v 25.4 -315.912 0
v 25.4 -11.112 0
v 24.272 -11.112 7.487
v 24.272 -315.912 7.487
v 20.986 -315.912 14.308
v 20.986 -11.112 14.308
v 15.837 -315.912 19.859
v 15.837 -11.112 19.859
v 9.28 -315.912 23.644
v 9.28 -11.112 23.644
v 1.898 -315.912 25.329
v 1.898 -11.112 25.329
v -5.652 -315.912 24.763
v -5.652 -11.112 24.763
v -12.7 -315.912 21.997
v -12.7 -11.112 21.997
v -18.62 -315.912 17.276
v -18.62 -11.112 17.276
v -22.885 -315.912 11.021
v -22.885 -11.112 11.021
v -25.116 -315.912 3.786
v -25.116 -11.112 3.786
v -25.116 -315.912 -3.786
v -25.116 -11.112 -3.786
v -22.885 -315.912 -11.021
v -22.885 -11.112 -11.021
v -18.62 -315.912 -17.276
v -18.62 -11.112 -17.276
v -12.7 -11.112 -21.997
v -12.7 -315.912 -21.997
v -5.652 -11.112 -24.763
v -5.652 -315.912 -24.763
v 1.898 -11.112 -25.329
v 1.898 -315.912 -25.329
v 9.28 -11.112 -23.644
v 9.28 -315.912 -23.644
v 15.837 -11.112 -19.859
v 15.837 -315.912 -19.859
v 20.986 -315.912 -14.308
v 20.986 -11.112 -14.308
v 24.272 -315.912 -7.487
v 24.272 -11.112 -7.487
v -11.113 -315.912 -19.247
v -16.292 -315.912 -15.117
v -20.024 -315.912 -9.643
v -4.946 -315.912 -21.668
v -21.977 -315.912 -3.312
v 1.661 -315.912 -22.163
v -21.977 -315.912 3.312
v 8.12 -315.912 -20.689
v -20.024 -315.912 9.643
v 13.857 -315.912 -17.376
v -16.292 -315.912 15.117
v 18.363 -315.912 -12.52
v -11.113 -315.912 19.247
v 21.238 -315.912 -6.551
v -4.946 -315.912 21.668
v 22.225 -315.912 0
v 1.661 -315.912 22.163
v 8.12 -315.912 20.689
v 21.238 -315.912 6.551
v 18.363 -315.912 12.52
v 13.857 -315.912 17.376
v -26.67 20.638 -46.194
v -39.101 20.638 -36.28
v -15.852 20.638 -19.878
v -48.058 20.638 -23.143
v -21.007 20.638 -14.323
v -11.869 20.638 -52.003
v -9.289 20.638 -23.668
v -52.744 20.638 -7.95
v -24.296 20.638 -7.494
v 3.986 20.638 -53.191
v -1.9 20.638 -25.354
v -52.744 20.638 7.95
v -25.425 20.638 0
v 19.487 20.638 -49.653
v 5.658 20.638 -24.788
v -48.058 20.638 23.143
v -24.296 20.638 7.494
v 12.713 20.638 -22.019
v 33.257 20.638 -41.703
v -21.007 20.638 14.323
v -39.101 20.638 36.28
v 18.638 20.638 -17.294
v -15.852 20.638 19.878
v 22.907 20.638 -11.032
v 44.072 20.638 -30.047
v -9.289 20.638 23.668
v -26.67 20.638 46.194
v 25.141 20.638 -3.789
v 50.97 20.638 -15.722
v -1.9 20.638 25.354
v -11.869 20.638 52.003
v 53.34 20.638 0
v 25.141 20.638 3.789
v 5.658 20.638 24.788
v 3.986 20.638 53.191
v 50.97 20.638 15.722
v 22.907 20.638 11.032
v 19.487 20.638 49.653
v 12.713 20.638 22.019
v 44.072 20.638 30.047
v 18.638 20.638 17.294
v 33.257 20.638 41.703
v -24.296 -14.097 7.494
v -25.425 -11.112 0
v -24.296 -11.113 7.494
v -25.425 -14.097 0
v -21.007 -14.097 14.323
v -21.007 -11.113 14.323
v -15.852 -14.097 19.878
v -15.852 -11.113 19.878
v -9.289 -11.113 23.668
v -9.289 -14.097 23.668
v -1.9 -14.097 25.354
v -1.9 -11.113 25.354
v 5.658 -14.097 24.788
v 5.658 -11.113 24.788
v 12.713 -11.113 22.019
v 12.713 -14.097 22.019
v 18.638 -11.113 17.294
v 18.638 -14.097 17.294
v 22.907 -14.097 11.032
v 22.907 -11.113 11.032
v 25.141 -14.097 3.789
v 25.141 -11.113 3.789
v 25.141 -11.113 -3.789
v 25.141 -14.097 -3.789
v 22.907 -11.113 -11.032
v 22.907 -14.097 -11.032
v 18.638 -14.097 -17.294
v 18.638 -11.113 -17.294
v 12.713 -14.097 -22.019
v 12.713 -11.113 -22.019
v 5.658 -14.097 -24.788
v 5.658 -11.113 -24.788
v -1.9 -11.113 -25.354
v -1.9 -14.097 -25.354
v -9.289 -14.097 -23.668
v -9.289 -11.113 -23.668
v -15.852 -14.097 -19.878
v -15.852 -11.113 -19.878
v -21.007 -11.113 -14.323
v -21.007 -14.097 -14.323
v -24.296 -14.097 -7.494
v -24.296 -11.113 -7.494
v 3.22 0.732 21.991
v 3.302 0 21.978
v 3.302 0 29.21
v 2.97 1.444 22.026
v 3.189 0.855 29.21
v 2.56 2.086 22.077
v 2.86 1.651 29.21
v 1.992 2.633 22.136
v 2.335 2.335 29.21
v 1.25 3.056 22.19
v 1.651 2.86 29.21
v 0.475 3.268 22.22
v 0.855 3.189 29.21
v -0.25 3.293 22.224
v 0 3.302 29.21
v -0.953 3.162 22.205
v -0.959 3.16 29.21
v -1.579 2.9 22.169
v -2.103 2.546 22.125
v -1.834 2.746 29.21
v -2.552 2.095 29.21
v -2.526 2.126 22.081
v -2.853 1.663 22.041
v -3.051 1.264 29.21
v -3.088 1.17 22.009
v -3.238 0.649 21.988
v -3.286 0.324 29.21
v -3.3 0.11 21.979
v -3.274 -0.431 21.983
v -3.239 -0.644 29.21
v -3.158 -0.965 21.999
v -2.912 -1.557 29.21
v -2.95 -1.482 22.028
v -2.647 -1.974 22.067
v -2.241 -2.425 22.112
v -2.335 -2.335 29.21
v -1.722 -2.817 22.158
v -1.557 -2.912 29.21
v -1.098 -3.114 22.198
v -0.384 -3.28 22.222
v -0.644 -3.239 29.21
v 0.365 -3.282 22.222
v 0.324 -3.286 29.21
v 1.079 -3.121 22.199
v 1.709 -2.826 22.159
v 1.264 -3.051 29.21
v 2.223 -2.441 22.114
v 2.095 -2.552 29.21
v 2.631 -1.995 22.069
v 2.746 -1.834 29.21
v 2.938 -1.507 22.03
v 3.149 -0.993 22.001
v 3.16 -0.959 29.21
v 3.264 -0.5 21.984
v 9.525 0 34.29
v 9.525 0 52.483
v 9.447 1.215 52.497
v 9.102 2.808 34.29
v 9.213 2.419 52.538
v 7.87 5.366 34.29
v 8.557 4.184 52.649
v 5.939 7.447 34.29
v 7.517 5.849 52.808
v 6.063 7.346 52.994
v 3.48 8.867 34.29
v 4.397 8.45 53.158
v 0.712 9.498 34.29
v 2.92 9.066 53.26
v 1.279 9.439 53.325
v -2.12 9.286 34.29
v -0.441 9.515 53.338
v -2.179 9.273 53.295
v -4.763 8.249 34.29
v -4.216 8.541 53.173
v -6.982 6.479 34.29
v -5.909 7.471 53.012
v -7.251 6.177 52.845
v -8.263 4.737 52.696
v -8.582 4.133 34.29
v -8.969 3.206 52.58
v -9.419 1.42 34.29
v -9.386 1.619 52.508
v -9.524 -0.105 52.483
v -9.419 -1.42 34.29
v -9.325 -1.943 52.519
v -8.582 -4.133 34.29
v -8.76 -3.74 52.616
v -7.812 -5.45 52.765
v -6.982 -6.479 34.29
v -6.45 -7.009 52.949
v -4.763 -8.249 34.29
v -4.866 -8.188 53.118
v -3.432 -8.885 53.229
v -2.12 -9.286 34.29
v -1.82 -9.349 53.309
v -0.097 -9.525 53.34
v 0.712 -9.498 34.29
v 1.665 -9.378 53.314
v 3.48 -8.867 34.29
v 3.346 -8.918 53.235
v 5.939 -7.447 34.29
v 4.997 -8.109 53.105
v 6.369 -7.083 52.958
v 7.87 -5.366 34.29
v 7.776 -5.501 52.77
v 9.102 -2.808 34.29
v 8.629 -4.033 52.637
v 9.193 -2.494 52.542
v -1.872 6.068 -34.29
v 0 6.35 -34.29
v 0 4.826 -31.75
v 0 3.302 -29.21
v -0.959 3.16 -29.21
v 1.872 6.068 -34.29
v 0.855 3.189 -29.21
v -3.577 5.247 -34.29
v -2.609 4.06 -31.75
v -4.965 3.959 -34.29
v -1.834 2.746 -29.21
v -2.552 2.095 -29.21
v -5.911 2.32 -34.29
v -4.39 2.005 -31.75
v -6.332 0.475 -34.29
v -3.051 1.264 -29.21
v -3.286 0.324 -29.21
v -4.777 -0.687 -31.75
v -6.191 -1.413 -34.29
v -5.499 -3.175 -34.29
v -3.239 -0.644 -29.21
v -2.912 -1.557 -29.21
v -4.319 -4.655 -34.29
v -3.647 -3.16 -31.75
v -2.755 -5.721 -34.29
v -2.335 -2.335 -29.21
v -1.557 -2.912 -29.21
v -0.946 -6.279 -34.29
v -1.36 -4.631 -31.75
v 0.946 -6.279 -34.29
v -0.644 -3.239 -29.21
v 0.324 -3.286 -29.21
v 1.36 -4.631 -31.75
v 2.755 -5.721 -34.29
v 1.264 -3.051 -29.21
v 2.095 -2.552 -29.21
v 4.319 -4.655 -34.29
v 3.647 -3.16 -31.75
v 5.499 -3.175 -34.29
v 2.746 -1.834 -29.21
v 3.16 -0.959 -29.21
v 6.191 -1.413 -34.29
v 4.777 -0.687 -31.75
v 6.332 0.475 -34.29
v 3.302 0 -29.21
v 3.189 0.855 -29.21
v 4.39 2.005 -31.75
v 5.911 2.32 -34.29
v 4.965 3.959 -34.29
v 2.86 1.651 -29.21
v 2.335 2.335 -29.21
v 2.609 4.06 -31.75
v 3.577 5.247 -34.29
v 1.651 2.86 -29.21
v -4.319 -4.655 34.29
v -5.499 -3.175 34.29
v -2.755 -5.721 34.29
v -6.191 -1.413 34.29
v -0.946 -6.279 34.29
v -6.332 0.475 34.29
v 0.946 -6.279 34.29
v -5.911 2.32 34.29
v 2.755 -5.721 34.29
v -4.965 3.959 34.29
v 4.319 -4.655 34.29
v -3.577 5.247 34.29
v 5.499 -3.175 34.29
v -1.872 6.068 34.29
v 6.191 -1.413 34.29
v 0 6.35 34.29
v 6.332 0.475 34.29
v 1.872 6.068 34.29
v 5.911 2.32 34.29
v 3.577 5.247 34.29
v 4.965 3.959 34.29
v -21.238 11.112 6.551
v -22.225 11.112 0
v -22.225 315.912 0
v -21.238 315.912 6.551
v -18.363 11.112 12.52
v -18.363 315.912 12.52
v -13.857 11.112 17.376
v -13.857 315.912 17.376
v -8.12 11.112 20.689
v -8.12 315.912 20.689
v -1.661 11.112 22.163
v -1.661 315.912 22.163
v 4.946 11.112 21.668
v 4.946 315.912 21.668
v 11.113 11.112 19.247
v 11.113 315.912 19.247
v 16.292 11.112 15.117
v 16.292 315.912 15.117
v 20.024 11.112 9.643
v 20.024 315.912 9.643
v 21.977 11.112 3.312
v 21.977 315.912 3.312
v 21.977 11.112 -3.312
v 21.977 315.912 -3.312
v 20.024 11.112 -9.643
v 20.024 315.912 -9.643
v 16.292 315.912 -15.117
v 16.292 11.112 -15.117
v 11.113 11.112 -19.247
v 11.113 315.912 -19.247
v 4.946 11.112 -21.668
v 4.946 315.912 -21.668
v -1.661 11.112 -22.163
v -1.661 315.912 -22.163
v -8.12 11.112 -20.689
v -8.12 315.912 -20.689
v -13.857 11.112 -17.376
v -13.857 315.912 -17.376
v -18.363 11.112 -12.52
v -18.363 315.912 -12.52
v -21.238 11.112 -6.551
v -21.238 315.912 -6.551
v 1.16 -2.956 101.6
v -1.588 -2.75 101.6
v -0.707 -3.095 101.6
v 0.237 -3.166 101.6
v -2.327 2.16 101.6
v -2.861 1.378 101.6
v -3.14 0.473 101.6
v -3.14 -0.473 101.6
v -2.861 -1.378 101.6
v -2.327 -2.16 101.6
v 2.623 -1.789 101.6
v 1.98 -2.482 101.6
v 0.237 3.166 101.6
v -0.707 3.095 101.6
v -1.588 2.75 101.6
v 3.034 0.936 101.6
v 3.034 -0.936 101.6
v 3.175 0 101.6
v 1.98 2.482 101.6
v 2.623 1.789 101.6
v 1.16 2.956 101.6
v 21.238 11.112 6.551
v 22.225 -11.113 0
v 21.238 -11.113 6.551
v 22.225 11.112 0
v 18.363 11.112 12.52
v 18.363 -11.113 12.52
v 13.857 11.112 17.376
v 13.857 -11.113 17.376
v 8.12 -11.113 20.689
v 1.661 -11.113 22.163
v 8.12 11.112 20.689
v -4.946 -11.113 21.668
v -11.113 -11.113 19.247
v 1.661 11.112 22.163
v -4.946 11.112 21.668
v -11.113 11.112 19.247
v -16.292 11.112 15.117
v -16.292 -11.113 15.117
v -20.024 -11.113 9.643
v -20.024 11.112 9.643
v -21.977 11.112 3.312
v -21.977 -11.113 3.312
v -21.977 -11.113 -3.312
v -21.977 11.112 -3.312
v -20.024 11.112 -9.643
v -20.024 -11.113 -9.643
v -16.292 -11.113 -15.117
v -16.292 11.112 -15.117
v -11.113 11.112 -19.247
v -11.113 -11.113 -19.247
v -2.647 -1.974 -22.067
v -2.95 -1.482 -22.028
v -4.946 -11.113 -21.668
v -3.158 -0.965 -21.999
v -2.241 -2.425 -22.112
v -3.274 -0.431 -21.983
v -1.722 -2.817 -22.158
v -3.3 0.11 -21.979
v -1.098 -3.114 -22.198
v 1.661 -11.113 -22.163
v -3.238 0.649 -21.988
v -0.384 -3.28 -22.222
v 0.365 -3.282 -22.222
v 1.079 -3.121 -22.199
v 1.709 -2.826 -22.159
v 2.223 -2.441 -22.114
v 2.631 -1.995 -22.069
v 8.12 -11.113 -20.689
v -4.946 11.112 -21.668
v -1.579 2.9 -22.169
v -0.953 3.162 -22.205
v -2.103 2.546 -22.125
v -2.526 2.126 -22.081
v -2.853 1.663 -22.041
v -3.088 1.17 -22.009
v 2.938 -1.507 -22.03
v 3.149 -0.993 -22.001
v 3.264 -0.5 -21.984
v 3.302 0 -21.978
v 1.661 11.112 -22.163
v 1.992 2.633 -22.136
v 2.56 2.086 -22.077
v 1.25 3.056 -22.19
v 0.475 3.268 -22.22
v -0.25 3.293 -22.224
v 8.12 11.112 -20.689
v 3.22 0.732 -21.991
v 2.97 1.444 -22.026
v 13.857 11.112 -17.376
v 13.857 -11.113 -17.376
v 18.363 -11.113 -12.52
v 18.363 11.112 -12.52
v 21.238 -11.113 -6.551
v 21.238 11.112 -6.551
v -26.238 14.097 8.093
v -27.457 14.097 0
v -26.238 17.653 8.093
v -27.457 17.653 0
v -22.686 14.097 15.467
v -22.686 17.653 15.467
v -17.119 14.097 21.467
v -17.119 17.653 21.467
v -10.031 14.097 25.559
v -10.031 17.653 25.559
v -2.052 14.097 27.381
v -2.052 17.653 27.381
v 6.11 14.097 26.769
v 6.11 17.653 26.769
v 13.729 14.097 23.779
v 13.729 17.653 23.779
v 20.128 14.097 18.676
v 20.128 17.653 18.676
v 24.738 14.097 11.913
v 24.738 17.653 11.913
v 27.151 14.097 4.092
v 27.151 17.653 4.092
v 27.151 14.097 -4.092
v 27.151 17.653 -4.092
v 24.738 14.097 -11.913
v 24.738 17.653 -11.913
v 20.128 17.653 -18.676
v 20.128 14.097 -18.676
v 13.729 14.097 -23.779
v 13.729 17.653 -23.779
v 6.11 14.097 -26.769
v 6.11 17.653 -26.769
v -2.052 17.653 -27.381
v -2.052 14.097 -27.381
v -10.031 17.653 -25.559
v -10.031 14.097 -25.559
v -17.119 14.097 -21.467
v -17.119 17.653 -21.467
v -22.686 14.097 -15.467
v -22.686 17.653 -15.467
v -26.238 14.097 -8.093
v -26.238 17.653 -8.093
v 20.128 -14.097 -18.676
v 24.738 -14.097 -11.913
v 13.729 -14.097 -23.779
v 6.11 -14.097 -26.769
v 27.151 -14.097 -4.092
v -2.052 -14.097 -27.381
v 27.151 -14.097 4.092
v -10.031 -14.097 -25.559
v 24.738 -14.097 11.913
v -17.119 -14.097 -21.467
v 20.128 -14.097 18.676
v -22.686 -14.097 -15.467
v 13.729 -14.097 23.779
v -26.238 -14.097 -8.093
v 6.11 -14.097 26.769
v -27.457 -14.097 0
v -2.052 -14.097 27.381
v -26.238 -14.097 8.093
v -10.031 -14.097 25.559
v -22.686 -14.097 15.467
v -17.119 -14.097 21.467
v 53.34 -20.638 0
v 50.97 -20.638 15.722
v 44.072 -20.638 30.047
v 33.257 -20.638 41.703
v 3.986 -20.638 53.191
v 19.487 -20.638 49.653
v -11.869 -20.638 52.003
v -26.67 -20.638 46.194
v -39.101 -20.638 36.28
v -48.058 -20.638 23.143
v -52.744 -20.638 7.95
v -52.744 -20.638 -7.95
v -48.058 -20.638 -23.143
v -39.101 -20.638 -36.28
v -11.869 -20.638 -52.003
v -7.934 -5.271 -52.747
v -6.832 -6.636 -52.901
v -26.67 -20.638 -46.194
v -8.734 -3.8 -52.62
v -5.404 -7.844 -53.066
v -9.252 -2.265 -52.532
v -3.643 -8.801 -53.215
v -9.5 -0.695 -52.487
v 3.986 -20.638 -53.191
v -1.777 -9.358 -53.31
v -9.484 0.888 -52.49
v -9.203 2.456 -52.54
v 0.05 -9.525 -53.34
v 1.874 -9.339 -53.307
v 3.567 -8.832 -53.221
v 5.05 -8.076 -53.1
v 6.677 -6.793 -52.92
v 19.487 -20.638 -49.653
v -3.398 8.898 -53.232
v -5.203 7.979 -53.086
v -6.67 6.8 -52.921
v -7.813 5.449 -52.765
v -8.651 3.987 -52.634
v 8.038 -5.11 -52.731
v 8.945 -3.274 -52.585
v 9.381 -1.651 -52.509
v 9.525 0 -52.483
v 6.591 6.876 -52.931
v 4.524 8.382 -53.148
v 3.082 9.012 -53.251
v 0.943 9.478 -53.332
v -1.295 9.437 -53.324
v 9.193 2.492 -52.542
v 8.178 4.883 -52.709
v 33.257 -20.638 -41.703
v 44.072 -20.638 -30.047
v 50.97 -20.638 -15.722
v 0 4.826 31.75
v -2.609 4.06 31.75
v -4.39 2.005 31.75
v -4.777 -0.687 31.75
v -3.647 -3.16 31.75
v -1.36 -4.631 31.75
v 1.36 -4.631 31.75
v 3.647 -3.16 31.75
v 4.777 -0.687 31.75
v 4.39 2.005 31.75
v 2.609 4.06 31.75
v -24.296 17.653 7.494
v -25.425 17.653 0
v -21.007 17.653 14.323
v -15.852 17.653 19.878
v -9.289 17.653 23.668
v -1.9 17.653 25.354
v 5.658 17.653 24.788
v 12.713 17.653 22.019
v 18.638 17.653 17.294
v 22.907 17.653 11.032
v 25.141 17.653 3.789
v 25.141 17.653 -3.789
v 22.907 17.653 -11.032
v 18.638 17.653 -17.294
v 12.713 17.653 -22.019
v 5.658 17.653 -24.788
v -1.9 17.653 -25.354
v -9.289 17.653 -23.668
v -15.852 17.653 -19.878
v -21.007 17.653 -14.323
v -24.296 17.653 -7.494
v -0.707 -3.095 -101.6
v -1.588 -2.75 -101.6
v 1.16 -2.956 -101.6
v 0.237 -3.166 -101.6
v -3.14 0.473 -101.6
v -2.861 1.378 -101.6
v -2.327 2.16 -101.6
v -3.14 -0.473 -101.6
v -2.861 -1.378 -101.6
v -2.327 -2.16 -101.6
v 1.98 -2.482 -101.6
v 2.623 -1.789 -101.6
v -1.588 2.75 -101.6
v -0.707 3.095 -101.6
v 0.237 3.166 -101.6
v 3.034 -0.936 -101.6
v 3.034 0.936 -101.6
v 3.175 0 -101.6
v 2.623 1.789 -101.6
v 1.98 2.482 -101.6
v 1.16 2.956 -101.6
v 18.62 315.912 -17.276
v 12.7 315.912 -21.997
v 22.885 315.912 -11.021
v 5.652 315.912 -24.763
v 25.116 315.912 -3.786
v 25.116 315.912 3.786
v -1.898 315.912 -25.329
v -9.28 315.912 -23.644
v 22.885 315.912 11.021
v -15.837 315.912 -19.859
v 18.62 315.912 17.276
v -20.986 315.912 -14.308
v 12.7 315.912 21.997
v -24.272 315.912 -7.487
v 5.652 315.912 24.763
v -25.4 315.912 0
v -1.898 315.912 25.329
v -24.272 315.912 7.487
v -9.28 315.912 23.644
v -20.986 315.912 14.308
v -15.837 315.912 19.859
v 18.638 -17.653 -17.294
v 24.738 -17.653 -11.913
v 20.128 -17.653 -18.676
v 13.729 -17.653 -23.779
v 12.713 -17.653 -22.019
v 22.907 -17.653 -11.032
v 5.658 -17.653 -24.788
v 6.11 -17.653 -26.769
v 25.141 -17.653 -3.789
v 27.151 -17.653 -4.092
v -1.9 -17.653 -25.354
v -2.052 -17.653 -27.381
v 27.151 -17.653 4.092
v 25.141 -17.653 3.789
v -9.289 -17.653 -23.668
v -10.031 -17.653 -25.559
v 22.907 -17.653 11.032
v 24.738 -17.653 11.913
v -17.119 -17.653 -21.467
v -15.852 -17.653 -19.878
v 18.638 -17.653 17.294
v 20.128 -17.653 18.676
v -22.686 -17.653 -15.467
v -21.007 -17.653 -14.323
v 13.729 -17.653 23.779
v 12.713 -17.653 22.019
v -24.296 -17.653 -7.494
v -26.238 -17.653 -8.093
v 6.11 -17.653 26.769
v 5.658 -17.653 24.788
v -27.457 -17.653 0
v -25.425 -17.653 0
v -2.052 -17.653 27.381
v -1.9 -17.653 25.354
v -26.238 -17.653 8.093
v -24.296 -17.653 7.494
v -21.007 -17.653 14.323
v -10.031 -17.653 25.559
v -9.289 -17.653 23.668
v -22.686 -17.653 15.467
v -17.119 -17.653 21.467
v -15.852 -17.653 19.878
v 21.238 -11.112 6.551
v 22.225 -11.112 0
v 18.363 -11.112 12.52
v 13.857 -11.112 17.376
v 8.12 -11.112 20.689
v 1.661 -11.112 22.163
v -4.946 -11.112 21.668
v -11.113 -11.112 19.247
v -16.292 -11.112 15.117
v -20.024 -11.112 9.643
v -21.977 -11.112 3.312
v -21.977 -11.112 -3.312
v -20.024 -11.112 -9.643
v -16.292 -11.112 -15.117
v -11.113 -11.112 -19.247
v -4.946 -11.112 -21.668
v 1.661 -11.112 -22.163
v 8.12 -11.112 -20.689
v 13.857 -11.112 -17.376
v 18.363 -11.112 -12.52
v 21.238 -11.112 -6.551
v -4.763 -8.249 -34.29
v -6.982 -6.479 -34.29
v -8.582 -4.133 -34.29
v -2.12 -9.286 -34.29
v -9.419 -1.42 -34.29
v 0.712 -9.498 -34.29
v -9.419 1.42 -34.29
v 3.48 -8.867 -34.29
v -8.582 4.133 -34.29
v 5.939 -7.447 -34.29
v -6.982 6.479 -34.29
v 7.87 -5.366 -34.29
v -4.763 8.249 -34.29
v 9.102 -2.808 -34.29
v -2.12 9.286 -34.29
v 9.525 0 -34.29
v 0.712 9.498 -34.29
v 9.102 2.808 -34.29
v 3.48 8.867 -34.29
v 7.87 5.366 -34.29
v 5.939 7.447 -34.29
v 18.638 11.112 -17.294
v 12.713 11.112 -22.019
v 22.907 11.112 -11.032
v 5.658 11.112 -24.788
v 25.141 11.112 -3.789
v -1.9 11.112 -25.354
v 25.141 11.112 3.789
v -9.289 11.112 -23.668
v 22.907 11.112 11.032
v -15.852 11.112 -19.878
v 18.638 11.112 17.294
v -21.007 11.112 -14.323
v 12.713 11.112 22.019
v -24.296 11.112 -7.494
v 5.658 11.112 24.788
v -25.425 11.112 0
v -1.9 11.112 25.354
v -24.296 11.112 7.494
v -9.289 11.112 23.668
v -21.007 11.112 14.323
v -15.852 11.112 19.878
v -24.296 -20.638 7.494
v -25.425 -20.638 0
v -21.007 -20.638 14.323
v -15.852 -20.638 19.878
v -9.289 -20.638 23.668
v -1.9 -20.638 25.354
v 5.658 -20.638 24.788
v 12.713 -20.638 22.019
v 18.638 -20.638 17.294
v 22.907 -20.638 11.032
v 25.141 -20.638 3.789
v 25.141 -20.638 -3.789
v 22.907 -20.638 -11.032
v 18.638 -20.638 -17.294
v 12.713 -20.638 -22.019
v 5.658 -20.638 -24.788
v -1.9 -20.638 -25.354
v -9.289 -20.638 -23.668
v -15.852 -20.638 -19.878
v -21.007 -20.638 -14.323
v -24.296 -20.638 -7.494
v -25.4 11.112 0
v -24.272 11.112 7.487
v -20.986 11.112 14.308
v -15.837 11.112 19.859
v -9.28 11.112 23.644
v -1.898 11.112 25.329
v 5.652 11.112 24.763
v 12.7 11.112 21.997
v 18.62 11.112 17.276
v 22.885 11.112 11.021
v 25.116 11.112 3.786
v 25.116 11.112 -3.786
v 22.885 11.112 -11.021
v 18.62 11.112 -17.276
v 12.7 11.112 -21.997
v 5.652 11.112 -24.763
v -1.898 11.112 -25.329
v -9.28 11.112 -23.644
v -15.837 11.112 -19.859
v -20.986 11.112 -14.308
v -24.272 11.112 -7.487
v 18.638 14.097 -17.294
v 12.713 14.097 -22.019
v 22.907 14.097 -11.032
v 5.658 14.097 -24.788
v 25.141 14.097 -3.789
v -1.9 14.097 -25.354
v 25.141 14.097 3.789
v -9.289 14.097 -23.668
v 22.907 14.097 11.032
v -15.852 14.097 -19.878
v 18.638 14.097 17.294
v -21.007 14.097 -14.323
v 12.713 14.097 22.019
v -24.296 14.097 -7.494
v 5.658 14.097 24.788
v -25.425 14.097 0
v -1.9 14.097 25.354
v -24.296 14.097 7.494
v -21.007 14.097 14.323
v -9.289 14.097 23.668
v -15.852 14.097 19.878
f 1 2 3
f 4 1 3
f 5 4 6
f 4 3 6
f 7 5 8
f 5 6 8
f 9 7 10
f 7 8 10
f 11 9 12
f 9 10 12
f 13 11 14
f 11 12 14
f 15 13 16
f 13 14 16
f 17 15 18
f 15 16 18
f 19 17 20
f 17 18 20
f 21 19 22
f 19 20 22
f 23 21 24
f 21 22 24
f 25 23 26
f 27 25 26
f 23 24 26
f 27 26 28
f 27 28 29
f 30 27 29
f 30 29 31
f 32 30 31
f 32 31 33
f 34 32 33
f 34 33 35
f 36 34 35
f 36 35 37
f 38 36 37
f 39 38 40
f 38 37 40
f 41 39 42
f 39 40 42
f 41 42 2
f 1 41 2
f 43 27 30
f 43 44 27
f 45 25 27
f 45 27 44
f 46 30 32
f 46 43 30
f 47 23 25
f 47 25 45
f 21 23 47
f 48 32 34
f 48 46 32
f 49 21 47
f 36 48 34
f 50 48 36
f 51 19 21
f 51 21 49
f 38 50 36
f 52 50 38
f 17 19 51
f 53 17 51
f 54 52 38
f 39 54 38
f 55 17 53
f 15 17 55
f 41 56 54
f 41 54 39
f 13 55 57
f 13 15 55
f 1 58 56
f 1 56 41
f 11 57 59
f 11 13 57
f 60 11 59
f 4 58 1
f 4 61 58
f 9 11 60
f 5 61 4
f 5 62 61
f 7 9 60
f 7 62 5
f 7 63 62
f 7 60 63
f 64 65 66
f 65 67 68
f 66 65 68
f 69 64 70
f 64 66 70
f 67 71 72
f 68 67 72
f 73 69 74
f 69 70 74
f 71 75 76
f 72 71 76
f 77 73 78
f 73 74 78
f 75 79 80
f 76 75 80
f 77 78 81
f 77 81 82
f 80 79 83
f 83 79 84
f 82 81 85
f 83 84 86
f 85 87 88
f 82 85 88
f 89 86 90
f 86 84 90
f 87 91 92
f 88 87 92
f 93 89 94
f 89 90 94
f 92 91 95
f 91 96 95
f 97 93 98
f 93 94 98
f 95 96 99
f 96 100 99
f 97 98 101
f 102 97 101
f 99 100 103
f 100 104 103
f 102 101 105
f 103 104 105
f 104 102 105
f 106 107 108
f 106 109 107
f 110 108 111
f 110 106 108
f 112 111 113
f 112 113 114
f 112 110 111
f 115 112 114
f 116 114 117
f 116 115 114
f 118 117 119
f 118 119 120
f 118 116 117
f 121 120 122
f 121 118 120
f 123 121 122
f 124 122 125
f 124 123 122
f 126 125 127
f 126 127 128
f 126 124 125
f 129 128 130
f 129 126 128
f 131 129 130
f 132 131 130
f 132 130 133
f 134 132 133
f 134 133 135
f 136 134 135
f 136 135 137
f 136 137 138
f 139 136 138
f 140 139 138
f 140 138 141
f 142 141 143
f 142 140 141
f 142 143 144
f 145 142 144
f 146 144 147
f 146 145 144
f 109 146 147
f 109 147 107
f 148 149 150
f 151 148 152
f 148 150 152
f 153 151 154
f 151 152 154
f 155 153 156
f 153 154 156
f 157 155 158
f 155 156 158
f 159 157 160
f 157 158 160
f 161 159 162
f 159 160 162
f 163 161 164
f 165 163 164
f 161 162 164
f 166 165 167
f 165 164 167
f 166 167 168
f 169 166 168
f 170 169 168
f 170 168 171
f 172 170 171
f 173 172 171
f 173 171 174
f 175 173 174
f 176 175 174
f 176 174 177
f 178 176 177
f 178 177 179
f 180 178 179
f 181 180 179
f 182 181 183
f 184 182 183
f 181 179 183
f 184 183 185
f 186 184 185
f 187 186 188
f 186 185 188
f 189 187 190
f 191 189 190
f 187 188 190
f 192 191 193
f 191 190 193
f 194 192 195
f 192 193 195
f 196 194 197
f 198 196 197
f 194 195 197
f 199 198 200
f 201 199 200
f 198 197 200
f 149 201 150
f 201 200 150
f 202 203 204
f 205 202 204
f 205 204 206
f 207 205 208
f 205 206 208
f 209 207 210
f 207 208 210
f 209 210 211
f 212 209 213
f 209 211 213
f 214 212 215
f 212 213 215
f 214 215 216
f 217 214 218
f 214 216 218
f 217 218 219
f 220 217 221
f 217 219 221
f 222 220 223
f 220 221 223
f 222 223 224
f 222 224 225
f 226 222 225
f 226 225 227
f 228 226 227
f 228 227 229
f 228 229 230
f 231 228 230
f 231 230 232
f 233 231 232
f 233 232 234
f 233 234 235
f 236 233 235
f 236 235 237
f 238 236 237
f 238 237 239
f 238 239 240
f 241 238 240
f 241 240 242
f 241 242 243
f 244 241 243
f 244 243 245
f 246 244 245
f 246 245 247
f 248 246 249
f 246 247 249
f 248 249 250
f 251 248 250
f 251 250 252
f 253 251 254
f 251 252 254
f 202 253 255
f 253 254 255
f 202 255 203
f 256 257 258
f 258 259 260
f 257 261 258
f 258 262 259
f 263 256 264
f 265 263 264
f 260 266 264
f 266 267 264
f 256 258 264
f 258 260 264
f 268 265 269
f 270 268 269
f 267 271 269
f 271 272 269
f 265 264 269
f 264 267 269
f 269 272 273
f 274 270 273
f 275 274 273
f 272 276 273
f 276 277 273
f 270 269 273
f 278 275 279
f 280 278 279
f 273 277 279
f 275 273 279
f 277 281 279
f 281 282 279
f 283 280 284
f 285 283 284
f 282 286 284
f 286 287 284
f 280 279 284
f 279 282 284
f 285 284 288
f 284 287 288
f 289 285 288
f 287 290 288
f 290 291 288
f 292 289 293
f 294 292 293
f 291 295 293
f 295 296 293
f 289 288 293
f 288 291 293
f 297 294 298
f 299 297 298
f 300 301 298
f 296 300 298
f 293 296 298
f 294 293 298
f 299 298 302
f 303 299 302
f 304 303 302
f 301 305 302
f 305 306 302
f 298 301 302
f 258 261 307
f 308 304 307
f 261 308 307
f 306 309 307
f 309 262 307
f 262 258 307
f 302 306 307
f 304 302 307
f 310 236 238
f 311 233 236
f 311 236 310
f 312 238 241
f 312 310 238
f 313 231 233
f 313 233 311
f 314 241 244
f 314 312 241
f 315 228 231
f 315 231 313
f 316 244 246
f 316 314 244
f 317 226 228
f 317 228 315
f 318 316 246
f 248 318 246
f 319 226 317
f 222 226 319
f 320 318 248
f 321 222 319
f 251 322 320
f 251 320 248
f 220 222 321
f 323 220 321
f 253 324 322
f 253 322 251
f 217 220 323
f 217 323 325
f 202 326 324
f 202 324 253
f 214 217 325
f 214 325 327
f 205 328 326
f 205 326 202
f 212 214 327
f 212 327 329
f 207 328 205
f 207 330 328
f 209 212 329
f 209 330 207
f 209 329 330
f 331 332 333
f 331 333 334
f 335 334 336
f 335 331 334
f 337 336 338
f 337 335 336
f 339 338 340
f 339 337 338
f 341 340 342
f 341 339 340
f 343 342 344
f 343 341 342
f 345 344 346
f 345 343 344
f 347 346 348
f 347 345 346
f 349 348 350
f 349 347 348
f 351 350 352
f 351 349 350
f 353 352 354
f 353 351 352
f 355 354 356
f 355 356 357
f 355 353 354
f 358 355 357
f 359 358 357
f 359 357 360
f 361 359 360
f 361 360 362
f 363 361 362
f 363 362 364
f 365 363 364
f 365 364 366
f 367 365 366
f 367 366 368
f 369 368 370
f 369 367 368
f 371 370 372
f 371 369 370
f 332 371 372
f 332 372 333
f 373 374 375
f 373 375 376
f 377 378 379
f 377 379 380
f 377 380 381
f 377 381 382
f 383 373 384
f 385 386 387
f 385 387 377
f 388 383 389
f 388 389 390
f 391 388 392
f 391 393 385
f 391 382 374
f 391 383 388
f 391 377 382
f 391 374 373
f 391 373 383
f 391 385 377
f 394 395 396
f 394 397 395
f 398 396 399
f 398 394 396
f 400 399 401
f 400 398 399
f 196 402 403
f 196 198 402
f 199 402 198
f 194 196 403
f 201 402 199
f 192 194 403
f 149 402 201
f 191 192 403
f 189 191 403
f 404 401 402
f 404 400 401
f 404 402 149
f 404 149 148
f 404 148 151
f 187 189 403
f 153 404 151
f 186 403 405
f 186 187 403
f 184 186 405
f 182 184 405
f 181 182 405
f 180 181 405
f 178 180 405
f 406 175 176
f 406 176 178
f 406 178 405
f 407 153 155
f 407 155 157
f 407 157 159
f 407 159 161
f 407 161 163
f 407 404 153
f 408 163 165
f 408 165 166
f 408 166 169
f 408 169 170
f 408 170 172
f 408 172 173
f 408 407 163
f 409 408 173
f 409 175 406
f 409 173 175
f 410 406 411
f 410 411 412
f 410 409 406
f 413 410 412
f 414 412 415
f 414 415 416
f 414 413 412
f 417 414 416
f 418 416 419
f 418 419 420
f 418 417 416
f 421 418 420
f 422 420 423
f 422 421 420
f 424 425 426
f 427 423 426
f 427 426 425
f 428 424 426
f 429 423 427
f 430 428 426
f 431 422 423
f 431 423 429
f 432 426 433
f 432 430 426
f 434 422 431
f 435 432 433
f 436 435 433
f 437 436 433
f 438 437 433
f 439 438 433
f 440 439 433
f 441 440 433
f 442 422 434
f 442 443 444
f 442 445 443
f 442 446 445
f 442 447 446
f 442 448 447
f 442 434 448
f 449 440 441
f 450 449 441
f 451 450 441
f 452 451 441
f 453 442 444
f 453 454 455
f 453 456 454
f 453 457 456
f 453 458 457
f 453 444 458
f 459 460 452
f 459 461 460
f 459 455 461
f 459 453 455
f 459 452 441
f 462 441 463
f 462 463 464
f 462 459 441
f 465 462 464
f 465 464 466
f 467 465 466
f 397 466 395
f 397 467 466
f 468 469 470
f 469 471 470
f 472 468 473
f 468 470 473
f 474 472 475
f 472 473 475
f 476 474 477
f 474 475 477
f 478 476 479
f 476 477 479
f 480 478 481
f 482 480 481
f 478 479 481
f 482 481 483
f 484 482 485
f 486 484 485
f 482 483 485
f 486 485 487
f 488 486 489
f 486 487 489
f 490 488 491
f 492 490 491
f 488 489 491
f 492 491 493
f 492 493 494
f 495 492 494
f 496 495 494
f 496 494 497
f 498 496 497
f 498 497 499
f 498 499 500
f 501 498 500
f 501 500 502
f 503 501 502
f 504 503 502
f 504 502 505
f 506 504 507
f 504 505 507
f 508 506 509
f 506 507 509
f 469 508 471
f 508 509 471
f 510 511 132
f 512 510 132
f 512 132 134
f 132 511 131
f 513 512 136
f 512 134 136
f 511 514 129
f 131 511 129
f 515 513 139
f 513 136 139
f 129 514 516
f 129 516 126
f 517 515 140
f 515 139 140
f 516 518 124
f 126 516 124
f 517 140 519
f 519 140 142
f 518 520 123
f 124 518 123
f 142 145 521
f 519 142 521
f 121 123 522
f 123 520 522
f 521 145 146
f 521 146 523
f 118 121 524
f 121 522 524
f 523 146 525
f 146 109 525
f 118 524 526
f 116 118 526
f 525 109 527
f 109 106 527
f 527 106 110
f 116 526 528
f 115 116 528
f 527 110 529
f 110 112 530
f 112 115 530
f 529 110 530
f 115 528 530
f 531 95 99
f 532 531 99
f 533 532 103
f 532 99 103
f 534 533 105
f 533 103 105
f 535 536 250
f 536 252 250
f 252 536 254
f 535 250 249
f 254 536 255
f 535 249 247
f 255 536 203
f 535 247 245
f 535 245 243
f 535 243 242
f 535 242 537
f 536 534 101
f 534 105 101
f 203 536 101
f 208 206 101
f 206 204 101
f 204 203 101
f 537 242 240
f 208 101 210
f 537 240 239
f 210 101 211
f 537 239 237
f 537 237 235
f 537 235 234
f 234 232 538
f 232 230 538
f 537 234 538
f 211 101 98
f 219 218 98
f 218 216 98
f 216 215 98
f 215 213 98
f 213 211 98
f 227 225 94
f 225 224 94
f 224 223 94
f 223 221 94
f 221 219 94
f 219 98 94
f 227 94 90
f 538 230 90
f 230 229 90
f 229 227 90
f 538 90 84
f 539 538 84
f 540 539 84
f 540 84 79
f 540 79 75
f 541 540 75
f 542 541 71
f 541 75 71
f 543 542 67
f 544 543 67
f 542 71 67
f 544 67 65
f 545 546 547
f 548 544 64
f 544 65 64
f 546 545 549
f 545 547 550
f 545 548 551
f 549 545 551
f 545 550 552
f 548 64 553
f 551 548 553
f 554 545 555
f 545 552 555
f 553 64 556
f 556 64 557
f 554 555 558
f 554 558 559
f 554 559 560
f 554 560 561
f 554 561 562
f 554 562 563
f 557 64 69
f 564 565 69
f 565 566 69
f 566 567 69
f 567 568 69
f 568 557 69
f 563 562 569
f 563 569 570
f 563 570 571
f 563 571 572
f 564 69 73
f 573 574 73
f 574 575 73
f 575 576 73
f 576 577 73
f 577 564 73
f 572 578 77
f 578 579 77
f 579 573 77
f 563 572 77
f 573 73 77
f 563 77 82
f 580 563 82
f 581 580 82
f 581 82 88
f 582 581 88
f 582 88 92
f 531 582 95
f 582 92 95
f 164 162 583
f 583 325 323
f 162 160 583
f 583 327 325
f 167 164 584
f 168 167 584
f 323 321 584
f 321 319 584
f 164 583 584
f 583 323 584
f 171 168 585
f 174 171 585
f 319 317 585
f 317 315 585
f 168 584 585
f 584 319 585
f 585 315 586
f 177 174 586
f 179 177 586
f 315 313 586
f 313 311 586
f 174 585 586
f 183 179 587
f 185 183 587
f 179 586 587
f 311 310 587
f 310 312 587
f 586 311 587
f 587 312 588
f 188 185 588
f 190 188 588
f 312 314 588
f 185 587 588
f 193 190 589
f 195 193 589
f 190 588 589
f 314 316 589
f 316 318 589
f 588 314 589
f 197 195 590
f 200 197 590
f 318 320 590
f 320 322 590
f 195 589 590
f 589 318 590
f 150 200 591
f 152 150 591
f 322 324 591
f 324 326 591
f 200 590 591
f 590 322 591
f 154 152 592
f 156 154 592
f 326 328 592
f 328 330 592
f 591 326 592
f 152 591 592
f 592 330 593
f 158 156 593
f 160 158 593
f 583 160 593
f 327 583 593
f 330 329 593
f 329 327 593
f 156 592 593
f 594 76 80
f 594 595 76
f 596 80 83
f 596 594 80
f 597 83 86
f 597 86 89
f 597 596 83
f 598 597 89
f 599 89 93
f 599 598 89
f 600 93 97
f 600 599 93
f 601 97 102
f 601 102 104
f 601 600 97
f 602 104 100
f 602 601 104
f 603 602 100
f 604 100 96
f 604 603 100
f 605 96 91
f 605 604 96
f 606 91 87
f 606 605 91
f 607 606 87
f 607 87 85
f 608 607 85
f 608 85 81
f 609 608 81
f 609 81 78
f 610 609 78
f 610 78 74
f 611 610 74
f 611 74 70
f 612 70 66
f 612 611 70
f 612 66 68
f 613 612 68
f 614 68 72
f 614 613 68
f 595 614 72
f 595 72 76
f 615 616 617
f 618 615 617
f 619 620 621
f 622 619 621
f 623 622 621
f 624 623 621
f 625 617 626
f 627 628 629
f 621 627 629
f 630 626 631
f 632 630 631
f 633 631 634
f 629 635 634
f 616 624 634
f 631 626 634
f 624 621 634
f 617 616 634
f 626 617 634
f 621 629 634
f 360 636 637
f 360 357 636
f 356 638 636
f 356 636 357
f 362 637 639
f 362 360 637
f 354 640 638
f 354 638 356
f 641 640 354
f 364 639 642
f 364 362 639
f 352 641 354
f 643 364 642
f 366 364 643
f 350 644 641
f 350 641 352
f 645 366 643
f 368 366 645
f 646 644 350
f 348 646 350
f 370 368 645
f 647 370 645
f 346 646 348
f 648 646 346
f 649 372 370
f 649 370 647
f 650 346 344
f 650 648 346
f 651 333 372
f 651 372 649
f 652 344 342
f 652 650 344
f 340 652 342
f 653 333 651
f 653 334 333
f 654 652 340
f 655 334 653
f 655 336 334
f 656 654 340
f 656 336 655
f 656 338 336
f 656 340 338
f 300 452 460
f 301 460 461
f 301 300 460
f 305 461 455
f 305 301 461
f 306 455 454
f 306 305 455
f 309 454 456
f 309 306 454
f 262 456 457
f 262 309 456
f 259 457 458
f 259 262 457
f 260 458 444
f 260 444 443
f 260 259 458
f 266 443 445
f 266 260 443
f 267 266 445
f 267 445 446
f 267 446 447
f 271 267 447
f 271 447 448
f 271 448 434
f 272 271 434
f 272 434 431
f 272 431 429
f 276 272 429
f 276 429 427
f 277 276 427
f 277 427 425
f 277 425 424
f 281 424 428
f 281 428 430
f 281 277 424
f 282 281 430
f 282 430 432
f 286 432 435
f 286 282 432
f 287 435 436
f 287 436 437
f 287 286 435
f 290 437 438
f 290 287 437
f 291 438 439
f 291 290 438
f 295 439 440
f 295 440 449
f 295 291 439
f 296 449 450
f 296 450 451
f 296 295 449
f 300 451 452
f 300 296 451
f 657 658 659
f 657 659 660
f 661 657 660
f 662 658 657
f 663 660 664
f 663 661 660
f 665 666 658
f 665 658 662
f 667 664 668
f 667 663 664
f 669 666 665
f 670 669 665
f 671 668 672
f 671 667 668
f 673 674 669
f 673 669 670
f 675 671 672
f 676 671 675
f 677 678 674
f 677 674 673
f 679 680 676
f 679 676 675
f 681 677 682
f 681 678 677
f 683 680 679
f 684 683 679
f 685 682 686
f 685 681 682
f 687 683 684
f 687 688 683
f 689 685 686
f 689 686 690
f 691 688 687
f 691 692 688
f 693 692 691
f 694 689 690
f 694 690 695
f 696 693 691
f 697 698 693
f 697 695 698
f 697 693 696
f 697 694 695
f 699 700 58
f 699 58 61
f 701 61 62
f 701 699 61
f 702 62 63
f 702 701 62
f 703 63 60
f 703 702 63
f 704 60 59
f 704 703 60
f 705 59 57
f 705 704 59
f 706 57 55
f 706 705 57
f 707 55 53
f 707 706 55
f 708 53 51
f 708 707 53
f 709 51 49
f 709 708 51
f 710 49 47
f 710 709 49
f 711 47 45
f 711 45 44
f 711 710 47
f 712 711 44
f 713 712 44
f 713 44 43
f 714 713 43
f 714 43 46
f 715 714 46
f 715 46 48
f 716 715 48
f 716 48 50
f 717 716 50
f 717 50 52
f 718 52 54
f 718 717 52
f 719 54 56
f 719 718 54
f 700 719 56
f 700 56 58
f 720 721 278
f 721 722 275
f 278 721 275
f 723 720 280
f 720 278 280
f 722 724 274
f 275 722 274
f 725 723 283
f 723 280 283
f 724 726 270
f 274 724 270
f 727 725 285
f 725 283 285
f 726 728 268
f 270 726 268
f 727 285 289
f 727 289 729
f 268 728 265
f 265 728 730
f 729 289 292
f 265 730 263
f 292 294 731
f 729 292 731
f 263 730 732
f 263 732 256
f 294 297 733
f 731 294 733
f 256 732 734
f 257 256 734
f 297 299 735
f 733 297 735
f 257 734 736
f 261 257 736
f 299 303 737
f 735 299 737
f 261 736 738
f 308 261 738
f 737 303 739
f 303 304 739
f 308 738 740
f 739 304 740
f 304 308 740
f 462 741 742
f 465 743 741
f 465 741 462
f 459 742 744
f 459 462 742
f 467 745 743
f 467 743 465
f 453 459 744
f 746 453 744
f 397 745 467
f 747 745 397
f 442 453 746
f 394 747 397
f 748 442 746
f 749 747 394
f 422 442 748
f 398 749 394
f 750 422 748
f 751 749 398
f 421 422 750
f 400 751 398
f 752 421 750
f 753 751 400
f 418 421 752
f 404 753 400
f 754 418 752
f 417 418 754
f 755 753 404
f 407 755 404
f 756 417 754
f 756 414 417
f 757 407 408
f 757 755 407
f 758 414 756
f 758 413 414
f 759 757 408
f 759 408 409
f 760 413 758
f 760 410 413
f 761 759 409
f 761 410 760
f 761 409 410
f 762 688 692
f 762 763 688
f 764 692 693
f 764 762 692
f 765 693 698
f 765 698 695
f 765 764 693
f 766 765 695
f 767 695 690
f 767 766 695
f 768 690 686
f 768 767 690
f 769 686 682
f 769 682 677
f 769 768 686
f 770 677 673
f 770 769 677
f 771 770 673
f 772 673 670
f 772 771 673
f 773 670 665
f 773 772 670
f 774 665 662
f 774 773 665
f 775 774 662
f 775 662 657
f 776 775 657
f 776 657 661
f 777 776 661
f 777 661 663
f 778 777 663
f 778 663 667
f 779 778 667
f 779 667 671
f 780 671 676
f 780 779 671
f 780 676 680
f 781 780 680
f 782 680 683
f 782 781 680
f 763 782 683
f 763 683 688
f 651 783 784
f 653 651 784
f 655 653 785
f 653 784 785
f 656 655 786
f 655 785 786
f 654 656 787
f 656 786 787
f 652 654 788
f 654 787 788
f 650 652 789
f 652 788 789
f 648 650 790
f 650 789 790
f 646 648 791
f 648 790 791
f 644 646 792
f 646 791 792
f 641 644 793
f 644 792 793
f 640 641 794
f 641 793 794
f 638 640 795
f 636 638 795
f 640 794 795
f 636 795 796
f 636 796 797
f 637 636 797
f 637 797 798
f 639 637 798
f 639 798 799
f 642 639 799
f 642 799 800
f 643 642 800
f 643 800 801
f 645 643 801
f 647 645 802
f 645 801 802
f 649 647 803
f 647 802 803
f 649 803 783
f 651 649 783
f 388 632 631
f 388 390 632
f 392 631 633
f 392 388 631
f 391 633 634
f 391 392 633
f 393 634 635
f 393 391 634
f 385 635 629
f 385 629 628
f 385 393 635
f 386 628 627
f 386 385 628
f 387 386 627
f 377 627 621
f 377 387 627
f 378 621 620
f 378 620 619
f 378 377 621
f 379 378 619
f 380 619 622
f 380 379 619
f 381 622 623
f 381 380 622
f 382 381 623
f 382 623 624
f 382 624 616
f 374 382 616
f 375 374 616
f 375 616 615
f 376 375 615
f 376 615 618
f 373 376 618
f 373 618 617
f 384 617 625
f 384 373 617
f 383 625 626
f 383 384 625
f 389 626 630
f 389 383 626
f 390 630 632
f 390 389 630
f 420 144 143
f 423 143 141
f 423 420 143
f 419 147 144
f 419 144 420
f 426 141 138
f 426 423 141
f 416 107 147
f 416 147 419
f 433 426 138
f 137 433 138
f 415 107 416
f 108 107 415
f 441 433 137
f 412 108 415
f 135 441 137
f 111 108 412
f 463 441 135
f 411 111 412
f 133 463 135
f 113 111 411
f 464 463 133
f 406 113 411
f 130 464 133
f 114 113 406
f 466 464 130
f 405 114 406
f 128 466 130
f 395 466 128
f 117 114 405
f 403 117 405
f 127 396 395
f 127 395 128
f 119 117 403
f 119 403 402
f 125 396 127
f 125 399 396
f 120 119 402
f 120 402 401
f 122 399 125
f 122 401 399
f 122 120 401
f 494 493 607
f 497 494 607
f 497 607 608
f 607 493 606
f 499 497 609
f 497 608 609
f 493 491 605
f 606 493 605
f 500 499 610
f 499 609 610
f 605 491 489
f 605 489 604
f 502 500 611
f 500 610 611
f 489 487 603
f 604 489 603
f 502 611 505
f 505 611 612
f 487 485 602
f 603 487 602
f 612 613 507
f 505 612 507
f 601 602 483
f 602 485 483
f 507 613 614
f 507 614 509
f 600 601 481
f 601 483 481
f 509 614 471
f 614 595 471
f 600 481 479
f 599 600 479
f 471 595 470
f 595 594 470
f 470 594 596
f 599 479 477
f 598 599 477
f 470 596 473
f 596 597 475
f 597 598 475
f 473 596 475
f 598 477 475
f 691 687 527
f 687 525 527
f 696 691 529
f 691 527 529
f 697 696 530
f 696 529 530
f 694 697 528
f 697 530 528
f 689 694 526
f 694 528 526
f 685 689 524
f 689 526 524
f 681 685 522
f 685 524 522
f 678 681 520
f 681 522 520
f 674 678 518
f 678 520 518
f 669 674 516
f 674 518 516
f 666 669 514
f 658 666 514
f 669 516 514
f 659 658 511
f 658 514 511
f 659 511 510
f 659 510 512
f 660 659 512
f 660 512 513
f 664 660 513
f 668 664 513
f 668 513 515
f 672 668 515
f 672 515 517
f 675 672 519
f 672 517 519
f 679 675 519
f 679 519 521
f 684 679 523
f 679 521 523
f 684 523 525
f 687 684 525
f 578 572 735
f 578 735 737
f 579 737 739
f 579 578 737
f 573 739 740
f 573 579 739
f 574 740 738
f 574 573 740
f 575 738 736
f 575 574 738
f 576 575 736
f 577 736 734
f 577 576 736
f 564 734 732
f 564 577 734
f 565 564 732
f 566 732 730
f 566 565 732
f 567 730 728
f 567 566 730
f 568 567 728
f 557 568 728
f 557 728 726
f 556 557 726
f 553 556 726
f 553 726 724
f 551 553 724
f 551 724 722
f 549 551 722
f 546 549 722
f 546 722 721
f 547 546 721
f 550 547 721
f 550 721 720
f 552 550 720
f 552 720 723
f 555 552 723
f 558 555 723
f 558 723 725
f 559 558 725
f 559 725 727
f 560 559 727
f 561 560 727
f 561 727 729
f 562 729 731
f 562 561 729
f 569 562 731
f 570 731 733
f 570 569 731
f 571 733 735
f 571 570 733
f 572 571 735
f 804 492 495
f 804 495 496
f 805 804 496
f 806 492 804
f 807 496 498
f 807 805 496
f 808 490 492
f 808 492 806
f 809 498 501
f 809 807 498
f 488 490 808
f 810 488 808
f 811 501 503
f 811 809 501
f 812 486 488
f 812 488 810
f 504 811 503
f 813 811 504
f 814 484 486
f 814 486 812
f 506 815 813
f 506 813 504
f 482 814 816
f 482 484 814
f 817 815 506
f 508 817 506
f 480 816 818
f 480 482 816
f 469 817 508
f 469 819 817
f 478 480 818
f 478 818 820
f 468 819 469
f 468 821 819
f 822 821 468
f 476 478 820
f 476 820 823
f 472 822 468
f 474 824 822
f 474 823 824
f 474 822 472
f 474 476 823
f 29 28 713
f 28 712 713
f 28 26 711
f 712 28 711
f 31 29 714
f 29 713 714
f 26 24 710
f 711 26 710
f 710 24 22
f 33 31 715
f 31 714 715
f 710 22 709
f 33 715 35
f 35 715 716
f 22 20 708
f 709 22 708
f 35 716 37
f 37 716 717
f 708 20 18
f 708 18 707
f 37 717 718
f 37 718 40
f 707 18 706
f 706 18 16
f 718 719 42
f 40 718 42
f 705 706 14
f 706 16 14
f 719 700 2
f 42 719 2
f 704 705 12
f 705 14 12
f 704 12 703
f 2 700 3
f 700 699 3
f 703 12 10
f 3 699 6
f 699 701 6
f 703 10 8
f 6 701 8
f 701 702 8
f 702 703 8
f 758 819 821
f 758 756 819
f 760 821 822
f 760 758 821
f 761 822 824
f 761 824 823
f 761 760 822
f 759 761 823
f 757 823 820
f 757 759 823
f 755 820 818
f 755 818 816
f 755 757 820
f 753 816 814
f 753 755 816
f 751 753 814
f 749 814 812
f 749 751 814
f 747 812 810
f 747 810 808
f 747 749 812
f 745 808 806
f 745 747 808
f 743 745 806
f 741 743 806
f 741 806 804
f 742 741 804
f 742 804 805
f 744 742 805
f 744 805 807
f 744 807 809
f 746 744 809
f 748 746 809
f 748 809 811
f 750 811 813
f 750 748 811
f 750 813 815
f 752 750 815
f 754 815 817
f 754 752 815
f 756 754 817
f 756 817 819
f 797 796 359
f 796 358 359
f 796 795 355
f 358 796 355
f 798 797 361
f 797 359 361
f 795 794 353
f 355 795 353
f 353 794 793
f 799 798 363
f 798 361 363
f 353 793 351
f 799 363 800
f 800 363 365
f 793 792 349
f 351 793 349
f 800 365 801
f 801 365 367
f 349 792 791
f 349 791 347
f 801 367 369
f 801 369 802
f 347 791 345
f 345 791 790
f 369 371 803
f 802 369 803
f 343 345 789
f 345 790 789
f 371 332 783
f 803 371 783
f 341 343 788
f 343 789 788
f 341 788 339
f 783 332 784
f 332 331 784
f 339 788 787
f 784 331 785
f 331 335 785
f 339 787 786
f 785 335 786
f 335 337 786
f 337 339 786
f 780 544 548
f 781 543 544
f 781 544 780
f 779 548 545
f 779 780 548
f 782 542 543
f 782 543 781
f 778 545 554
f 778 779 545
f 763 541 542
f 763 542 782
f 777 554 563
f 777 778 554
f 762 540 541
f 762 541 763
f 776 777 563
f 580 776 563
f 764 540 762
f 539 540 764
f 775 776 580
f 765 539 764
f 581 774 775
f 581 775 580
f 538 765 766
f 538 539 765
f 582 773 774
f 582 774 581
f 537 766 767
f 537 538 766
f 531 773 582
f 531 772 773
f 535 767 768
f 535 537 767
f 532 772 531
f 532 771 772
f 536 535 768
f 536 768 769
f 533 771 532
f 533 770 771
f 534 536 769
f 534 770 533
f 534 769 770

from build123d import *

# Parameters (mm, degrees)
F0_R      = 53.34
F0_R_2    = 22.225
F1_DEPTH  = 20.6375
F6_DEPTH  = 20.6375
F5_R      = 9.525
F5_R_2    = 3.302
F7_DEPTH  = 19.05
F8_DEPTH  = 32.3616602869
F4_R      = 9.525
F4_R_2    = 3.302
F9_DEPTH  = 19.05
F10_DEPTH = 32.3616602869
F13_W     = 2.032
F13_H     = 3.556
F15_R     = 3.175
F16_DEPTH = 101.6
F19_R     = 25.4
F19_R_2   = 22.225
F20_DEPTH = 304.8
F21_R     = 25.4
F21_R_2   = 22.225
F22_DEPTH = 304.8


# Not quite as in the source:
# - the program builds the solid bodies; features that only make, move or delete a surface that nothing else refers to are left out


with BuildPart() as f1:
    # F0 (on Front) → F1 (new body)
    with BuildSketch(Plane.XZ):
        Circle(F0_R)
        Circle(F0_R_2, mode=Mode.SUBTRACT)
    extrude(amount=-F1_DEPTH)

    # F0 (on Front) → F6 (join)
    with BuildSketch(Plane.XZ):
        Circle(F0_R)
        Circle(F0_R_2, mode=Mode.SUBTRACT)
    extrude(amount=F6_DEPTH)

    # F5 (on offset) → F7 (cut)
    with BuildSketch(Plane.XY.offset(-53.34)):
        Circle(F5_R)
        Circle(F5_R_2, mode=Mode.SUBTRACT)
        Circle(F5_R_2)
    extrude(amount=F7_DEPTH, mode=Mode.SUBTRACT)

    # F5 (on offset) → F8 (cut, up to face)
    with BuildSketch(Plane.XY.offset(-53.34)):
        Circle(F5_R_2)
    extrude(amount=F8_DEPTH, mode=Mode.SUBTRACT)

    # F4 (on offset) → F9 (cut)
    with BuildSketch(Plane.XY.offset(53.34)):
        Circle(F4_R)
        Circle(F4_R_2, mode=Mode.SUBTRACT)
        Circle(F4_R_2)
    extrude(amount=-F9_DEPTH, mode=Mode.SUBTRACT)

    # F4 (on offset) → F10 (cut, up to face)
    with BuildSketch(Plane.XY.offset(53.34)):
        Circle(F4_R_2)
    extrude(amount=-F10_DEPTH, mode=Mode.SUBTRACT)

    # F11 (on Right) → F12 (revolve, cut)
    with BuildSketch(Plane.YZ):
        Polygon((6.35, 34.29), (3.302, 34.29), (3.302, 29.21), align=None)
        Polygon((3.302, -29.21), (3.302, -34.29), (6.35, -34.29), align=None)
    revolve(axis=Axis((0, 0, 6.9711627439), (0, 0, 1)), mode=Mode.SUBTRACT)

    # F13 (on Top) → F14 (revolve, cut)
    with BuildSketch(Plane.XY):
        Polygon((-25.4254, 11.1125), (-22.225, 11.1125), (-22.225, 20.6375), (-25.4254, 20.6375), (-25.4254, 17.653), (-25.4254, 14.097), align=None)
        Polygon((-22.225, -20.6375), (-22.225, -11.1125), (-25.4254, -11.1125), (-25.4254, -14.097), (-25.4254, -17.653), (-25.4254, -20.6375), align=None)
        with Locations((-26.4414, 15.875)):
            Rectangle(F13_W, F13_H)
        with Locations((-26.4414, -15.875)):
            Rectangle(F13_W, F13_H)
    revolve(axis=Axis((0, 5.55625, 0), (0, 1, 0)), mode=Mode.SUBTRACT)


with BuildPart() as f16:
    # F15 (on Top) → F16 (new body, symmetric)
    with BuildSketch(Plane.XY):
        Circle(F15_R)
    extrude(amount=F16_DEPTH, both=True)


with BuildPart() as f20:
    # F19 (on face) → F20 (new body)
    with BuildSketch(Plane.XZ.offset(11.1125)):
        Circle(F19_R)
        Circle(F19_R_2, mode=Mode.SUBTRACT)
    extrude(amount=F20_DEPTH)


with BuildPart() as f22:
    # F21 (on face) → F22 (new body)
    with BuildSketch(Plane(origin=(0, 11.1125, 0), x_dir=(-1, 0, 0), z_dir=(0, 1, 0))):
        Circle(F21_R)
        Circle(F21_R_2, mode=Mode.SUBTRACT)
    extrude(amount=F22_DEPTH)


solid = Compound([f1.part, f16.part, f20.part, f22.part])
